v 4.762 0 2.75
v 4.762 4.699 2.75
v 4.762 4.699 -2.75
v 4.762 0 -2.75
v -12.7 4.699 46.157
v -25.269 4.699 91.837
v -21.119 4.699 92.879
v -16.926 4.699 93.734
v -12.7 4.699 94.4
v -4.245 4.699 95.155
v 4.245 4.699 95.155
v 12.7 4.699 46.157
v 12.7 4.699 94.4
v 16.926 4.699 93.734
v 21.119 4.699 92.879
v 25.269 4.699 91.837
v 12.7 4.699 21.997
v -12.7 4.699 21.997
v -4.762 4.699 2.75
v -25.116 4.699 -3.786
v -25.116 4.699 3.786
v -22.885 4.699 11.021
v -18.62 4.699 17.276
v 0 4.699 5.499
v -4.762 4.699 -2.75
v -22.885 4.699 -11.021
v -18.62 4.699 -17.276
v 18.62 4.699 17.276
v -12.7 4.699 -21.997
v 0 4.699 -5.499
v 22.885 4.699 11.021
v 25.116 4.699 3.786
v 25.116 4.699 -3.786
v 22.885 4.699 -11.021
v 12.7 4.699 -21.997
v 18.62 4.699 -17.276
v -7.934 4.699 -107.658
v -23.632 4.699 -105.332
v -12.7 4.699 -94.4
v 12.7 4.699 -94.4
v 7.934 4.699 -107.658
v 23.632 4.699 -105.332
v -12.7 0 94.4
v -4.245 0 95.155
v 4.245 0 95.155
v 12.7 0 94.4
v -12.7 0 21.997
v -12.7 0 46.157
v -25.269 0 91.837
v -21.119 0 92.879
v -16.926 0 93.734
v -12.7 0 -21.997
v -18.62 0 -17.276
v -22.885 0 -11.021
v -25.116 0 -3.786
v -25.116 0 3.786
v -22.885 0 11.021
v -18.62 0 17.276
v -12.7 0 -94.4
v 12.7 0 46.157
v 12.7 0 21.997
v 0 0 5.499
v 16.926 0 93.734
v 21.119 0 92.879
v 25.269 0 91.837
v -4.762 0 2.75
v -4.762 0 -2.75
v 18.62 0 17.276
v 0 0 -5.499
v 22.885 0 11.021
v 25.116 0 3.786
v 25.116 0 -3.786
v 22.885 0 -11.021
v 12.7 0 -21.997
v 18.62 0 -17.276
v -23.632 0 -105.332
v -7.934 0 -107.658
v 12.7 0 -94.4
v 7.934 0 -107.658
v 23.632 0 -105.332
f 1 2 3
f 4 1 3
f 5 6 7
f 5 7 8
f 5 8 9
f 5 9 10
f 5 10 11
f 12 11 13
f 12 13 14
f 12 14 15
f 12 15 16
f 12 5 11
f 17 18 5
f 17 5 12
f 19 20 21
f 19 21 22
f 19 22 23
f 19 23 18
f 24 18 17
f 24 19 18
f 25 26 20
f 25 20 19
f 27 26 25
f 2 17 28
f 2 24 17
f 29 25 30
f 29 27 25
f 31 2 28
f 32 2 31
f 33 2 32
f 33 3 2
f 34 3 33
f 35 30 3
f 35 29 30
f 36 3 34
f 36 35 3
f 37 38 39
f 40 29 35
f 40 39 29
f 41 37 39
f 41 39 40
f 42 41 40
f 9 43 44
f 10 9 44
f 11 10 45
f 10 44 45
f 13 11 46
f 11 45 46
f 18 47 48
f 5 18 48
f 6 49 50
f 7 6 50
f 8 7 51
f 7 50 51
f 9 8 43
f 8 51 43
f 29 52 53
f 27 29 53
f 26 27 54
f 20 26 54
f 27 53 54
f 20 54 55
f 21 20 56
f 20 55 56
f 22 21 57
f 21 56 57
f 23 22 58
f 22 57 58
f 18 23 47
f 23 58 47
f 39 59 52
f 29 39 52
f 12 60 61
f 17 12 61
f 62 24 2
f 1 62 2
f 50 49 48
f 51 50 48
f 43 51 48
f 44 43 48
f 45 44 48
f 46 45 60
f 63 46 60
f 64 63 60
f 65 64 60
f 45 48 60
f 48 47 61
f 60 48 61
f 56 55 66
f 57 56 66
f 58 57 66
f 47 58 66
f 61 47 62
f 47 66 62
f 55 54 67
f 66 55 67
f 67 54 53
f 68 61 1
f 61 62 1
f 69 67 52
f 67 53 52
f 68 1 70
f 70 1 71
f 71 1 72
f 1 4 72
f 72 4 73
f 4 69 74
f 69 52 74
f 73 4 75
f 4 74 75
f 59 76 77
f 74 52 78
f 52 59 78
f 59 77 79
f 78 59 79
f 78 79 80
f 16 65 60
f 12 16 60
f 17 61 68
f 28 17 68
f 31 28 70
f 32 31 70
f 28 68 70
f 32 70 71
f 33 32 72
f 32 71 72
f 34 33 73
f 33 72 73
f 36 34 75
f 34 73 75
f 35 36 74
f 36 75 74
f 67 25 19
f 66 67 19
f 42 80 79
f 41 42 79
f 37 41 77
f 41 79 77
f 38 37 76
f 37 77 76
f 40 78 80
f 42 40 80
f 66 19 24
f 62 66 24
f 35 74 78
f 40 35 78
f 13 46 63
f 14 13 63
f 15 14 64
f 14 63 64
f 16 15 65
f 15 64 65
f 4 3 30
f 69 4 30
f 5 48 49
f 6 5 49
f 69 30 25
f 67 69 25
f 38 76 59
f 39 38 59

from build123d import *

# Parameters (mm, degrees)
BOSS_EXTRUDE1_DEPTH = 4.699
CUT_EXTRUDE1_REACH  = 112.997


with BuildPart() as part:
    # Sketch2 → Boss-Extrude1 (new body)
    with BuildSketch(Plane(origin=(0, 0, 0), x_dir=(1, 0, 0), z_dir=(0, 1, 0))):
        with BuildLine():
            Line((12.7, 0), (-12.7, 0))
            Line((-12.7, 0), (-12.7, -21.997045256))
            Line((-12.7, -21.997045256), (-12.7, -46.157401043))
            Line((-12.7, -46.157401043), (-12.7, -94.399536545))
            ThreePointArc((-12.7, -94.399536545), (0, -95.25), (12.7, -94.399536545))
            Line((12.7, -94.399536545), (12.7, -46.157401043))
            Line((12.7, -46.157401043), (12.7, -21.997045256))
            Line((12.7, -21.997045256), (12.7, 0))
        make_face()
        with BuildLine():
            Line((-12.7, -94.399536545), (-12.7, -46.157401043))
            Line((-12.7, -46.157401043), (-25.268575407, -91.837147151))
            ThreePointArc((-25.268575407, -91.837147151), (-19.027470653, -93.330155151), (-12.7, -94.399536545))
        make_face()
        with BuildLine():
            Line((25.268575407, -91.837147151), (12.7, -46.157401043))
            Line((12.7, -46.157401043), (12.7, -94.399536545))
            ThreePointArc((12.7, -94.399536545), (19.027470653, -93.330155151), (25.268575407, -91.837147151))
        make_face()
        with BuildLine():
            Line((12.7, 21.997045256), (12.7, 0))
            Line((12.7, 0), (12.7, -21.997045256))
            ThreePointArc((12.7, -21.997045256), (25.4, 0), (12.7, 21.997045256))
        make_face()
        with BuildLine():
            Line((-12.7, -21.997045256), (-12.7, 0))
            Line((-12.7, 0), (-12.7, 21.997045256))
            ThreePointArc((-12.7, 21.997045256), (-25.4, 0), (-12.7, -21.997045256))
        make_face()
        with BuildLine():
            Line((-12.7, 21.997045256), (-12.7, 0))
            Line((-12.7, 0), (12.7, 0))
            Line((12.7, 0), (12.7, 21.997045256))
            Line((12.7, 21.997045256), (12.7, 94.399536545))
            Line((12.7, 94.399536545), (23.631994126, 105.331530672))
            ThreePointArc((23.631994126, 105.331530672), (0, 107.95), (-23.631994126, 105.331530672))
            Line((-23.631994126, 105.331530672), (-12.7, 94.399536545))
            Line((-12.7, 94.399536545), (-12.7, 21.997045256))
        make_face()
    extrude(amount=BOSS_EXTRUDE1_DEPTH)

    # Sketch3 → Cut-Extrude1 (cut, up to next)
    with BuildSketch(Plane(origin=(0, 4.699, 0), x_dir=(1, 0, 0), z_dir=(0, 1, 0)), mode=Mode.PRIVATE) as cut_extrude1_sk1:
        Polygon((-4.7625, 2.749630657), (-4.7625, -2.749630657), (0, -5.499261314), (4.7625, -2.749630657), (4.7625, 2.749630657), (0, 5.499261314), align=None)
    cut_extrude1_tool1 = extrude(cut_extrude1_sk1.sketch, amount=-CUT_EXTRUDE1_REACH, mode=Mode.PRIVATE) & part.part
    add(cut_extrude1_tool1.solids().sort_by_distance((0, 4.699, 0))[0], mode=Mode.SUBTRACT)


solid = part.part
